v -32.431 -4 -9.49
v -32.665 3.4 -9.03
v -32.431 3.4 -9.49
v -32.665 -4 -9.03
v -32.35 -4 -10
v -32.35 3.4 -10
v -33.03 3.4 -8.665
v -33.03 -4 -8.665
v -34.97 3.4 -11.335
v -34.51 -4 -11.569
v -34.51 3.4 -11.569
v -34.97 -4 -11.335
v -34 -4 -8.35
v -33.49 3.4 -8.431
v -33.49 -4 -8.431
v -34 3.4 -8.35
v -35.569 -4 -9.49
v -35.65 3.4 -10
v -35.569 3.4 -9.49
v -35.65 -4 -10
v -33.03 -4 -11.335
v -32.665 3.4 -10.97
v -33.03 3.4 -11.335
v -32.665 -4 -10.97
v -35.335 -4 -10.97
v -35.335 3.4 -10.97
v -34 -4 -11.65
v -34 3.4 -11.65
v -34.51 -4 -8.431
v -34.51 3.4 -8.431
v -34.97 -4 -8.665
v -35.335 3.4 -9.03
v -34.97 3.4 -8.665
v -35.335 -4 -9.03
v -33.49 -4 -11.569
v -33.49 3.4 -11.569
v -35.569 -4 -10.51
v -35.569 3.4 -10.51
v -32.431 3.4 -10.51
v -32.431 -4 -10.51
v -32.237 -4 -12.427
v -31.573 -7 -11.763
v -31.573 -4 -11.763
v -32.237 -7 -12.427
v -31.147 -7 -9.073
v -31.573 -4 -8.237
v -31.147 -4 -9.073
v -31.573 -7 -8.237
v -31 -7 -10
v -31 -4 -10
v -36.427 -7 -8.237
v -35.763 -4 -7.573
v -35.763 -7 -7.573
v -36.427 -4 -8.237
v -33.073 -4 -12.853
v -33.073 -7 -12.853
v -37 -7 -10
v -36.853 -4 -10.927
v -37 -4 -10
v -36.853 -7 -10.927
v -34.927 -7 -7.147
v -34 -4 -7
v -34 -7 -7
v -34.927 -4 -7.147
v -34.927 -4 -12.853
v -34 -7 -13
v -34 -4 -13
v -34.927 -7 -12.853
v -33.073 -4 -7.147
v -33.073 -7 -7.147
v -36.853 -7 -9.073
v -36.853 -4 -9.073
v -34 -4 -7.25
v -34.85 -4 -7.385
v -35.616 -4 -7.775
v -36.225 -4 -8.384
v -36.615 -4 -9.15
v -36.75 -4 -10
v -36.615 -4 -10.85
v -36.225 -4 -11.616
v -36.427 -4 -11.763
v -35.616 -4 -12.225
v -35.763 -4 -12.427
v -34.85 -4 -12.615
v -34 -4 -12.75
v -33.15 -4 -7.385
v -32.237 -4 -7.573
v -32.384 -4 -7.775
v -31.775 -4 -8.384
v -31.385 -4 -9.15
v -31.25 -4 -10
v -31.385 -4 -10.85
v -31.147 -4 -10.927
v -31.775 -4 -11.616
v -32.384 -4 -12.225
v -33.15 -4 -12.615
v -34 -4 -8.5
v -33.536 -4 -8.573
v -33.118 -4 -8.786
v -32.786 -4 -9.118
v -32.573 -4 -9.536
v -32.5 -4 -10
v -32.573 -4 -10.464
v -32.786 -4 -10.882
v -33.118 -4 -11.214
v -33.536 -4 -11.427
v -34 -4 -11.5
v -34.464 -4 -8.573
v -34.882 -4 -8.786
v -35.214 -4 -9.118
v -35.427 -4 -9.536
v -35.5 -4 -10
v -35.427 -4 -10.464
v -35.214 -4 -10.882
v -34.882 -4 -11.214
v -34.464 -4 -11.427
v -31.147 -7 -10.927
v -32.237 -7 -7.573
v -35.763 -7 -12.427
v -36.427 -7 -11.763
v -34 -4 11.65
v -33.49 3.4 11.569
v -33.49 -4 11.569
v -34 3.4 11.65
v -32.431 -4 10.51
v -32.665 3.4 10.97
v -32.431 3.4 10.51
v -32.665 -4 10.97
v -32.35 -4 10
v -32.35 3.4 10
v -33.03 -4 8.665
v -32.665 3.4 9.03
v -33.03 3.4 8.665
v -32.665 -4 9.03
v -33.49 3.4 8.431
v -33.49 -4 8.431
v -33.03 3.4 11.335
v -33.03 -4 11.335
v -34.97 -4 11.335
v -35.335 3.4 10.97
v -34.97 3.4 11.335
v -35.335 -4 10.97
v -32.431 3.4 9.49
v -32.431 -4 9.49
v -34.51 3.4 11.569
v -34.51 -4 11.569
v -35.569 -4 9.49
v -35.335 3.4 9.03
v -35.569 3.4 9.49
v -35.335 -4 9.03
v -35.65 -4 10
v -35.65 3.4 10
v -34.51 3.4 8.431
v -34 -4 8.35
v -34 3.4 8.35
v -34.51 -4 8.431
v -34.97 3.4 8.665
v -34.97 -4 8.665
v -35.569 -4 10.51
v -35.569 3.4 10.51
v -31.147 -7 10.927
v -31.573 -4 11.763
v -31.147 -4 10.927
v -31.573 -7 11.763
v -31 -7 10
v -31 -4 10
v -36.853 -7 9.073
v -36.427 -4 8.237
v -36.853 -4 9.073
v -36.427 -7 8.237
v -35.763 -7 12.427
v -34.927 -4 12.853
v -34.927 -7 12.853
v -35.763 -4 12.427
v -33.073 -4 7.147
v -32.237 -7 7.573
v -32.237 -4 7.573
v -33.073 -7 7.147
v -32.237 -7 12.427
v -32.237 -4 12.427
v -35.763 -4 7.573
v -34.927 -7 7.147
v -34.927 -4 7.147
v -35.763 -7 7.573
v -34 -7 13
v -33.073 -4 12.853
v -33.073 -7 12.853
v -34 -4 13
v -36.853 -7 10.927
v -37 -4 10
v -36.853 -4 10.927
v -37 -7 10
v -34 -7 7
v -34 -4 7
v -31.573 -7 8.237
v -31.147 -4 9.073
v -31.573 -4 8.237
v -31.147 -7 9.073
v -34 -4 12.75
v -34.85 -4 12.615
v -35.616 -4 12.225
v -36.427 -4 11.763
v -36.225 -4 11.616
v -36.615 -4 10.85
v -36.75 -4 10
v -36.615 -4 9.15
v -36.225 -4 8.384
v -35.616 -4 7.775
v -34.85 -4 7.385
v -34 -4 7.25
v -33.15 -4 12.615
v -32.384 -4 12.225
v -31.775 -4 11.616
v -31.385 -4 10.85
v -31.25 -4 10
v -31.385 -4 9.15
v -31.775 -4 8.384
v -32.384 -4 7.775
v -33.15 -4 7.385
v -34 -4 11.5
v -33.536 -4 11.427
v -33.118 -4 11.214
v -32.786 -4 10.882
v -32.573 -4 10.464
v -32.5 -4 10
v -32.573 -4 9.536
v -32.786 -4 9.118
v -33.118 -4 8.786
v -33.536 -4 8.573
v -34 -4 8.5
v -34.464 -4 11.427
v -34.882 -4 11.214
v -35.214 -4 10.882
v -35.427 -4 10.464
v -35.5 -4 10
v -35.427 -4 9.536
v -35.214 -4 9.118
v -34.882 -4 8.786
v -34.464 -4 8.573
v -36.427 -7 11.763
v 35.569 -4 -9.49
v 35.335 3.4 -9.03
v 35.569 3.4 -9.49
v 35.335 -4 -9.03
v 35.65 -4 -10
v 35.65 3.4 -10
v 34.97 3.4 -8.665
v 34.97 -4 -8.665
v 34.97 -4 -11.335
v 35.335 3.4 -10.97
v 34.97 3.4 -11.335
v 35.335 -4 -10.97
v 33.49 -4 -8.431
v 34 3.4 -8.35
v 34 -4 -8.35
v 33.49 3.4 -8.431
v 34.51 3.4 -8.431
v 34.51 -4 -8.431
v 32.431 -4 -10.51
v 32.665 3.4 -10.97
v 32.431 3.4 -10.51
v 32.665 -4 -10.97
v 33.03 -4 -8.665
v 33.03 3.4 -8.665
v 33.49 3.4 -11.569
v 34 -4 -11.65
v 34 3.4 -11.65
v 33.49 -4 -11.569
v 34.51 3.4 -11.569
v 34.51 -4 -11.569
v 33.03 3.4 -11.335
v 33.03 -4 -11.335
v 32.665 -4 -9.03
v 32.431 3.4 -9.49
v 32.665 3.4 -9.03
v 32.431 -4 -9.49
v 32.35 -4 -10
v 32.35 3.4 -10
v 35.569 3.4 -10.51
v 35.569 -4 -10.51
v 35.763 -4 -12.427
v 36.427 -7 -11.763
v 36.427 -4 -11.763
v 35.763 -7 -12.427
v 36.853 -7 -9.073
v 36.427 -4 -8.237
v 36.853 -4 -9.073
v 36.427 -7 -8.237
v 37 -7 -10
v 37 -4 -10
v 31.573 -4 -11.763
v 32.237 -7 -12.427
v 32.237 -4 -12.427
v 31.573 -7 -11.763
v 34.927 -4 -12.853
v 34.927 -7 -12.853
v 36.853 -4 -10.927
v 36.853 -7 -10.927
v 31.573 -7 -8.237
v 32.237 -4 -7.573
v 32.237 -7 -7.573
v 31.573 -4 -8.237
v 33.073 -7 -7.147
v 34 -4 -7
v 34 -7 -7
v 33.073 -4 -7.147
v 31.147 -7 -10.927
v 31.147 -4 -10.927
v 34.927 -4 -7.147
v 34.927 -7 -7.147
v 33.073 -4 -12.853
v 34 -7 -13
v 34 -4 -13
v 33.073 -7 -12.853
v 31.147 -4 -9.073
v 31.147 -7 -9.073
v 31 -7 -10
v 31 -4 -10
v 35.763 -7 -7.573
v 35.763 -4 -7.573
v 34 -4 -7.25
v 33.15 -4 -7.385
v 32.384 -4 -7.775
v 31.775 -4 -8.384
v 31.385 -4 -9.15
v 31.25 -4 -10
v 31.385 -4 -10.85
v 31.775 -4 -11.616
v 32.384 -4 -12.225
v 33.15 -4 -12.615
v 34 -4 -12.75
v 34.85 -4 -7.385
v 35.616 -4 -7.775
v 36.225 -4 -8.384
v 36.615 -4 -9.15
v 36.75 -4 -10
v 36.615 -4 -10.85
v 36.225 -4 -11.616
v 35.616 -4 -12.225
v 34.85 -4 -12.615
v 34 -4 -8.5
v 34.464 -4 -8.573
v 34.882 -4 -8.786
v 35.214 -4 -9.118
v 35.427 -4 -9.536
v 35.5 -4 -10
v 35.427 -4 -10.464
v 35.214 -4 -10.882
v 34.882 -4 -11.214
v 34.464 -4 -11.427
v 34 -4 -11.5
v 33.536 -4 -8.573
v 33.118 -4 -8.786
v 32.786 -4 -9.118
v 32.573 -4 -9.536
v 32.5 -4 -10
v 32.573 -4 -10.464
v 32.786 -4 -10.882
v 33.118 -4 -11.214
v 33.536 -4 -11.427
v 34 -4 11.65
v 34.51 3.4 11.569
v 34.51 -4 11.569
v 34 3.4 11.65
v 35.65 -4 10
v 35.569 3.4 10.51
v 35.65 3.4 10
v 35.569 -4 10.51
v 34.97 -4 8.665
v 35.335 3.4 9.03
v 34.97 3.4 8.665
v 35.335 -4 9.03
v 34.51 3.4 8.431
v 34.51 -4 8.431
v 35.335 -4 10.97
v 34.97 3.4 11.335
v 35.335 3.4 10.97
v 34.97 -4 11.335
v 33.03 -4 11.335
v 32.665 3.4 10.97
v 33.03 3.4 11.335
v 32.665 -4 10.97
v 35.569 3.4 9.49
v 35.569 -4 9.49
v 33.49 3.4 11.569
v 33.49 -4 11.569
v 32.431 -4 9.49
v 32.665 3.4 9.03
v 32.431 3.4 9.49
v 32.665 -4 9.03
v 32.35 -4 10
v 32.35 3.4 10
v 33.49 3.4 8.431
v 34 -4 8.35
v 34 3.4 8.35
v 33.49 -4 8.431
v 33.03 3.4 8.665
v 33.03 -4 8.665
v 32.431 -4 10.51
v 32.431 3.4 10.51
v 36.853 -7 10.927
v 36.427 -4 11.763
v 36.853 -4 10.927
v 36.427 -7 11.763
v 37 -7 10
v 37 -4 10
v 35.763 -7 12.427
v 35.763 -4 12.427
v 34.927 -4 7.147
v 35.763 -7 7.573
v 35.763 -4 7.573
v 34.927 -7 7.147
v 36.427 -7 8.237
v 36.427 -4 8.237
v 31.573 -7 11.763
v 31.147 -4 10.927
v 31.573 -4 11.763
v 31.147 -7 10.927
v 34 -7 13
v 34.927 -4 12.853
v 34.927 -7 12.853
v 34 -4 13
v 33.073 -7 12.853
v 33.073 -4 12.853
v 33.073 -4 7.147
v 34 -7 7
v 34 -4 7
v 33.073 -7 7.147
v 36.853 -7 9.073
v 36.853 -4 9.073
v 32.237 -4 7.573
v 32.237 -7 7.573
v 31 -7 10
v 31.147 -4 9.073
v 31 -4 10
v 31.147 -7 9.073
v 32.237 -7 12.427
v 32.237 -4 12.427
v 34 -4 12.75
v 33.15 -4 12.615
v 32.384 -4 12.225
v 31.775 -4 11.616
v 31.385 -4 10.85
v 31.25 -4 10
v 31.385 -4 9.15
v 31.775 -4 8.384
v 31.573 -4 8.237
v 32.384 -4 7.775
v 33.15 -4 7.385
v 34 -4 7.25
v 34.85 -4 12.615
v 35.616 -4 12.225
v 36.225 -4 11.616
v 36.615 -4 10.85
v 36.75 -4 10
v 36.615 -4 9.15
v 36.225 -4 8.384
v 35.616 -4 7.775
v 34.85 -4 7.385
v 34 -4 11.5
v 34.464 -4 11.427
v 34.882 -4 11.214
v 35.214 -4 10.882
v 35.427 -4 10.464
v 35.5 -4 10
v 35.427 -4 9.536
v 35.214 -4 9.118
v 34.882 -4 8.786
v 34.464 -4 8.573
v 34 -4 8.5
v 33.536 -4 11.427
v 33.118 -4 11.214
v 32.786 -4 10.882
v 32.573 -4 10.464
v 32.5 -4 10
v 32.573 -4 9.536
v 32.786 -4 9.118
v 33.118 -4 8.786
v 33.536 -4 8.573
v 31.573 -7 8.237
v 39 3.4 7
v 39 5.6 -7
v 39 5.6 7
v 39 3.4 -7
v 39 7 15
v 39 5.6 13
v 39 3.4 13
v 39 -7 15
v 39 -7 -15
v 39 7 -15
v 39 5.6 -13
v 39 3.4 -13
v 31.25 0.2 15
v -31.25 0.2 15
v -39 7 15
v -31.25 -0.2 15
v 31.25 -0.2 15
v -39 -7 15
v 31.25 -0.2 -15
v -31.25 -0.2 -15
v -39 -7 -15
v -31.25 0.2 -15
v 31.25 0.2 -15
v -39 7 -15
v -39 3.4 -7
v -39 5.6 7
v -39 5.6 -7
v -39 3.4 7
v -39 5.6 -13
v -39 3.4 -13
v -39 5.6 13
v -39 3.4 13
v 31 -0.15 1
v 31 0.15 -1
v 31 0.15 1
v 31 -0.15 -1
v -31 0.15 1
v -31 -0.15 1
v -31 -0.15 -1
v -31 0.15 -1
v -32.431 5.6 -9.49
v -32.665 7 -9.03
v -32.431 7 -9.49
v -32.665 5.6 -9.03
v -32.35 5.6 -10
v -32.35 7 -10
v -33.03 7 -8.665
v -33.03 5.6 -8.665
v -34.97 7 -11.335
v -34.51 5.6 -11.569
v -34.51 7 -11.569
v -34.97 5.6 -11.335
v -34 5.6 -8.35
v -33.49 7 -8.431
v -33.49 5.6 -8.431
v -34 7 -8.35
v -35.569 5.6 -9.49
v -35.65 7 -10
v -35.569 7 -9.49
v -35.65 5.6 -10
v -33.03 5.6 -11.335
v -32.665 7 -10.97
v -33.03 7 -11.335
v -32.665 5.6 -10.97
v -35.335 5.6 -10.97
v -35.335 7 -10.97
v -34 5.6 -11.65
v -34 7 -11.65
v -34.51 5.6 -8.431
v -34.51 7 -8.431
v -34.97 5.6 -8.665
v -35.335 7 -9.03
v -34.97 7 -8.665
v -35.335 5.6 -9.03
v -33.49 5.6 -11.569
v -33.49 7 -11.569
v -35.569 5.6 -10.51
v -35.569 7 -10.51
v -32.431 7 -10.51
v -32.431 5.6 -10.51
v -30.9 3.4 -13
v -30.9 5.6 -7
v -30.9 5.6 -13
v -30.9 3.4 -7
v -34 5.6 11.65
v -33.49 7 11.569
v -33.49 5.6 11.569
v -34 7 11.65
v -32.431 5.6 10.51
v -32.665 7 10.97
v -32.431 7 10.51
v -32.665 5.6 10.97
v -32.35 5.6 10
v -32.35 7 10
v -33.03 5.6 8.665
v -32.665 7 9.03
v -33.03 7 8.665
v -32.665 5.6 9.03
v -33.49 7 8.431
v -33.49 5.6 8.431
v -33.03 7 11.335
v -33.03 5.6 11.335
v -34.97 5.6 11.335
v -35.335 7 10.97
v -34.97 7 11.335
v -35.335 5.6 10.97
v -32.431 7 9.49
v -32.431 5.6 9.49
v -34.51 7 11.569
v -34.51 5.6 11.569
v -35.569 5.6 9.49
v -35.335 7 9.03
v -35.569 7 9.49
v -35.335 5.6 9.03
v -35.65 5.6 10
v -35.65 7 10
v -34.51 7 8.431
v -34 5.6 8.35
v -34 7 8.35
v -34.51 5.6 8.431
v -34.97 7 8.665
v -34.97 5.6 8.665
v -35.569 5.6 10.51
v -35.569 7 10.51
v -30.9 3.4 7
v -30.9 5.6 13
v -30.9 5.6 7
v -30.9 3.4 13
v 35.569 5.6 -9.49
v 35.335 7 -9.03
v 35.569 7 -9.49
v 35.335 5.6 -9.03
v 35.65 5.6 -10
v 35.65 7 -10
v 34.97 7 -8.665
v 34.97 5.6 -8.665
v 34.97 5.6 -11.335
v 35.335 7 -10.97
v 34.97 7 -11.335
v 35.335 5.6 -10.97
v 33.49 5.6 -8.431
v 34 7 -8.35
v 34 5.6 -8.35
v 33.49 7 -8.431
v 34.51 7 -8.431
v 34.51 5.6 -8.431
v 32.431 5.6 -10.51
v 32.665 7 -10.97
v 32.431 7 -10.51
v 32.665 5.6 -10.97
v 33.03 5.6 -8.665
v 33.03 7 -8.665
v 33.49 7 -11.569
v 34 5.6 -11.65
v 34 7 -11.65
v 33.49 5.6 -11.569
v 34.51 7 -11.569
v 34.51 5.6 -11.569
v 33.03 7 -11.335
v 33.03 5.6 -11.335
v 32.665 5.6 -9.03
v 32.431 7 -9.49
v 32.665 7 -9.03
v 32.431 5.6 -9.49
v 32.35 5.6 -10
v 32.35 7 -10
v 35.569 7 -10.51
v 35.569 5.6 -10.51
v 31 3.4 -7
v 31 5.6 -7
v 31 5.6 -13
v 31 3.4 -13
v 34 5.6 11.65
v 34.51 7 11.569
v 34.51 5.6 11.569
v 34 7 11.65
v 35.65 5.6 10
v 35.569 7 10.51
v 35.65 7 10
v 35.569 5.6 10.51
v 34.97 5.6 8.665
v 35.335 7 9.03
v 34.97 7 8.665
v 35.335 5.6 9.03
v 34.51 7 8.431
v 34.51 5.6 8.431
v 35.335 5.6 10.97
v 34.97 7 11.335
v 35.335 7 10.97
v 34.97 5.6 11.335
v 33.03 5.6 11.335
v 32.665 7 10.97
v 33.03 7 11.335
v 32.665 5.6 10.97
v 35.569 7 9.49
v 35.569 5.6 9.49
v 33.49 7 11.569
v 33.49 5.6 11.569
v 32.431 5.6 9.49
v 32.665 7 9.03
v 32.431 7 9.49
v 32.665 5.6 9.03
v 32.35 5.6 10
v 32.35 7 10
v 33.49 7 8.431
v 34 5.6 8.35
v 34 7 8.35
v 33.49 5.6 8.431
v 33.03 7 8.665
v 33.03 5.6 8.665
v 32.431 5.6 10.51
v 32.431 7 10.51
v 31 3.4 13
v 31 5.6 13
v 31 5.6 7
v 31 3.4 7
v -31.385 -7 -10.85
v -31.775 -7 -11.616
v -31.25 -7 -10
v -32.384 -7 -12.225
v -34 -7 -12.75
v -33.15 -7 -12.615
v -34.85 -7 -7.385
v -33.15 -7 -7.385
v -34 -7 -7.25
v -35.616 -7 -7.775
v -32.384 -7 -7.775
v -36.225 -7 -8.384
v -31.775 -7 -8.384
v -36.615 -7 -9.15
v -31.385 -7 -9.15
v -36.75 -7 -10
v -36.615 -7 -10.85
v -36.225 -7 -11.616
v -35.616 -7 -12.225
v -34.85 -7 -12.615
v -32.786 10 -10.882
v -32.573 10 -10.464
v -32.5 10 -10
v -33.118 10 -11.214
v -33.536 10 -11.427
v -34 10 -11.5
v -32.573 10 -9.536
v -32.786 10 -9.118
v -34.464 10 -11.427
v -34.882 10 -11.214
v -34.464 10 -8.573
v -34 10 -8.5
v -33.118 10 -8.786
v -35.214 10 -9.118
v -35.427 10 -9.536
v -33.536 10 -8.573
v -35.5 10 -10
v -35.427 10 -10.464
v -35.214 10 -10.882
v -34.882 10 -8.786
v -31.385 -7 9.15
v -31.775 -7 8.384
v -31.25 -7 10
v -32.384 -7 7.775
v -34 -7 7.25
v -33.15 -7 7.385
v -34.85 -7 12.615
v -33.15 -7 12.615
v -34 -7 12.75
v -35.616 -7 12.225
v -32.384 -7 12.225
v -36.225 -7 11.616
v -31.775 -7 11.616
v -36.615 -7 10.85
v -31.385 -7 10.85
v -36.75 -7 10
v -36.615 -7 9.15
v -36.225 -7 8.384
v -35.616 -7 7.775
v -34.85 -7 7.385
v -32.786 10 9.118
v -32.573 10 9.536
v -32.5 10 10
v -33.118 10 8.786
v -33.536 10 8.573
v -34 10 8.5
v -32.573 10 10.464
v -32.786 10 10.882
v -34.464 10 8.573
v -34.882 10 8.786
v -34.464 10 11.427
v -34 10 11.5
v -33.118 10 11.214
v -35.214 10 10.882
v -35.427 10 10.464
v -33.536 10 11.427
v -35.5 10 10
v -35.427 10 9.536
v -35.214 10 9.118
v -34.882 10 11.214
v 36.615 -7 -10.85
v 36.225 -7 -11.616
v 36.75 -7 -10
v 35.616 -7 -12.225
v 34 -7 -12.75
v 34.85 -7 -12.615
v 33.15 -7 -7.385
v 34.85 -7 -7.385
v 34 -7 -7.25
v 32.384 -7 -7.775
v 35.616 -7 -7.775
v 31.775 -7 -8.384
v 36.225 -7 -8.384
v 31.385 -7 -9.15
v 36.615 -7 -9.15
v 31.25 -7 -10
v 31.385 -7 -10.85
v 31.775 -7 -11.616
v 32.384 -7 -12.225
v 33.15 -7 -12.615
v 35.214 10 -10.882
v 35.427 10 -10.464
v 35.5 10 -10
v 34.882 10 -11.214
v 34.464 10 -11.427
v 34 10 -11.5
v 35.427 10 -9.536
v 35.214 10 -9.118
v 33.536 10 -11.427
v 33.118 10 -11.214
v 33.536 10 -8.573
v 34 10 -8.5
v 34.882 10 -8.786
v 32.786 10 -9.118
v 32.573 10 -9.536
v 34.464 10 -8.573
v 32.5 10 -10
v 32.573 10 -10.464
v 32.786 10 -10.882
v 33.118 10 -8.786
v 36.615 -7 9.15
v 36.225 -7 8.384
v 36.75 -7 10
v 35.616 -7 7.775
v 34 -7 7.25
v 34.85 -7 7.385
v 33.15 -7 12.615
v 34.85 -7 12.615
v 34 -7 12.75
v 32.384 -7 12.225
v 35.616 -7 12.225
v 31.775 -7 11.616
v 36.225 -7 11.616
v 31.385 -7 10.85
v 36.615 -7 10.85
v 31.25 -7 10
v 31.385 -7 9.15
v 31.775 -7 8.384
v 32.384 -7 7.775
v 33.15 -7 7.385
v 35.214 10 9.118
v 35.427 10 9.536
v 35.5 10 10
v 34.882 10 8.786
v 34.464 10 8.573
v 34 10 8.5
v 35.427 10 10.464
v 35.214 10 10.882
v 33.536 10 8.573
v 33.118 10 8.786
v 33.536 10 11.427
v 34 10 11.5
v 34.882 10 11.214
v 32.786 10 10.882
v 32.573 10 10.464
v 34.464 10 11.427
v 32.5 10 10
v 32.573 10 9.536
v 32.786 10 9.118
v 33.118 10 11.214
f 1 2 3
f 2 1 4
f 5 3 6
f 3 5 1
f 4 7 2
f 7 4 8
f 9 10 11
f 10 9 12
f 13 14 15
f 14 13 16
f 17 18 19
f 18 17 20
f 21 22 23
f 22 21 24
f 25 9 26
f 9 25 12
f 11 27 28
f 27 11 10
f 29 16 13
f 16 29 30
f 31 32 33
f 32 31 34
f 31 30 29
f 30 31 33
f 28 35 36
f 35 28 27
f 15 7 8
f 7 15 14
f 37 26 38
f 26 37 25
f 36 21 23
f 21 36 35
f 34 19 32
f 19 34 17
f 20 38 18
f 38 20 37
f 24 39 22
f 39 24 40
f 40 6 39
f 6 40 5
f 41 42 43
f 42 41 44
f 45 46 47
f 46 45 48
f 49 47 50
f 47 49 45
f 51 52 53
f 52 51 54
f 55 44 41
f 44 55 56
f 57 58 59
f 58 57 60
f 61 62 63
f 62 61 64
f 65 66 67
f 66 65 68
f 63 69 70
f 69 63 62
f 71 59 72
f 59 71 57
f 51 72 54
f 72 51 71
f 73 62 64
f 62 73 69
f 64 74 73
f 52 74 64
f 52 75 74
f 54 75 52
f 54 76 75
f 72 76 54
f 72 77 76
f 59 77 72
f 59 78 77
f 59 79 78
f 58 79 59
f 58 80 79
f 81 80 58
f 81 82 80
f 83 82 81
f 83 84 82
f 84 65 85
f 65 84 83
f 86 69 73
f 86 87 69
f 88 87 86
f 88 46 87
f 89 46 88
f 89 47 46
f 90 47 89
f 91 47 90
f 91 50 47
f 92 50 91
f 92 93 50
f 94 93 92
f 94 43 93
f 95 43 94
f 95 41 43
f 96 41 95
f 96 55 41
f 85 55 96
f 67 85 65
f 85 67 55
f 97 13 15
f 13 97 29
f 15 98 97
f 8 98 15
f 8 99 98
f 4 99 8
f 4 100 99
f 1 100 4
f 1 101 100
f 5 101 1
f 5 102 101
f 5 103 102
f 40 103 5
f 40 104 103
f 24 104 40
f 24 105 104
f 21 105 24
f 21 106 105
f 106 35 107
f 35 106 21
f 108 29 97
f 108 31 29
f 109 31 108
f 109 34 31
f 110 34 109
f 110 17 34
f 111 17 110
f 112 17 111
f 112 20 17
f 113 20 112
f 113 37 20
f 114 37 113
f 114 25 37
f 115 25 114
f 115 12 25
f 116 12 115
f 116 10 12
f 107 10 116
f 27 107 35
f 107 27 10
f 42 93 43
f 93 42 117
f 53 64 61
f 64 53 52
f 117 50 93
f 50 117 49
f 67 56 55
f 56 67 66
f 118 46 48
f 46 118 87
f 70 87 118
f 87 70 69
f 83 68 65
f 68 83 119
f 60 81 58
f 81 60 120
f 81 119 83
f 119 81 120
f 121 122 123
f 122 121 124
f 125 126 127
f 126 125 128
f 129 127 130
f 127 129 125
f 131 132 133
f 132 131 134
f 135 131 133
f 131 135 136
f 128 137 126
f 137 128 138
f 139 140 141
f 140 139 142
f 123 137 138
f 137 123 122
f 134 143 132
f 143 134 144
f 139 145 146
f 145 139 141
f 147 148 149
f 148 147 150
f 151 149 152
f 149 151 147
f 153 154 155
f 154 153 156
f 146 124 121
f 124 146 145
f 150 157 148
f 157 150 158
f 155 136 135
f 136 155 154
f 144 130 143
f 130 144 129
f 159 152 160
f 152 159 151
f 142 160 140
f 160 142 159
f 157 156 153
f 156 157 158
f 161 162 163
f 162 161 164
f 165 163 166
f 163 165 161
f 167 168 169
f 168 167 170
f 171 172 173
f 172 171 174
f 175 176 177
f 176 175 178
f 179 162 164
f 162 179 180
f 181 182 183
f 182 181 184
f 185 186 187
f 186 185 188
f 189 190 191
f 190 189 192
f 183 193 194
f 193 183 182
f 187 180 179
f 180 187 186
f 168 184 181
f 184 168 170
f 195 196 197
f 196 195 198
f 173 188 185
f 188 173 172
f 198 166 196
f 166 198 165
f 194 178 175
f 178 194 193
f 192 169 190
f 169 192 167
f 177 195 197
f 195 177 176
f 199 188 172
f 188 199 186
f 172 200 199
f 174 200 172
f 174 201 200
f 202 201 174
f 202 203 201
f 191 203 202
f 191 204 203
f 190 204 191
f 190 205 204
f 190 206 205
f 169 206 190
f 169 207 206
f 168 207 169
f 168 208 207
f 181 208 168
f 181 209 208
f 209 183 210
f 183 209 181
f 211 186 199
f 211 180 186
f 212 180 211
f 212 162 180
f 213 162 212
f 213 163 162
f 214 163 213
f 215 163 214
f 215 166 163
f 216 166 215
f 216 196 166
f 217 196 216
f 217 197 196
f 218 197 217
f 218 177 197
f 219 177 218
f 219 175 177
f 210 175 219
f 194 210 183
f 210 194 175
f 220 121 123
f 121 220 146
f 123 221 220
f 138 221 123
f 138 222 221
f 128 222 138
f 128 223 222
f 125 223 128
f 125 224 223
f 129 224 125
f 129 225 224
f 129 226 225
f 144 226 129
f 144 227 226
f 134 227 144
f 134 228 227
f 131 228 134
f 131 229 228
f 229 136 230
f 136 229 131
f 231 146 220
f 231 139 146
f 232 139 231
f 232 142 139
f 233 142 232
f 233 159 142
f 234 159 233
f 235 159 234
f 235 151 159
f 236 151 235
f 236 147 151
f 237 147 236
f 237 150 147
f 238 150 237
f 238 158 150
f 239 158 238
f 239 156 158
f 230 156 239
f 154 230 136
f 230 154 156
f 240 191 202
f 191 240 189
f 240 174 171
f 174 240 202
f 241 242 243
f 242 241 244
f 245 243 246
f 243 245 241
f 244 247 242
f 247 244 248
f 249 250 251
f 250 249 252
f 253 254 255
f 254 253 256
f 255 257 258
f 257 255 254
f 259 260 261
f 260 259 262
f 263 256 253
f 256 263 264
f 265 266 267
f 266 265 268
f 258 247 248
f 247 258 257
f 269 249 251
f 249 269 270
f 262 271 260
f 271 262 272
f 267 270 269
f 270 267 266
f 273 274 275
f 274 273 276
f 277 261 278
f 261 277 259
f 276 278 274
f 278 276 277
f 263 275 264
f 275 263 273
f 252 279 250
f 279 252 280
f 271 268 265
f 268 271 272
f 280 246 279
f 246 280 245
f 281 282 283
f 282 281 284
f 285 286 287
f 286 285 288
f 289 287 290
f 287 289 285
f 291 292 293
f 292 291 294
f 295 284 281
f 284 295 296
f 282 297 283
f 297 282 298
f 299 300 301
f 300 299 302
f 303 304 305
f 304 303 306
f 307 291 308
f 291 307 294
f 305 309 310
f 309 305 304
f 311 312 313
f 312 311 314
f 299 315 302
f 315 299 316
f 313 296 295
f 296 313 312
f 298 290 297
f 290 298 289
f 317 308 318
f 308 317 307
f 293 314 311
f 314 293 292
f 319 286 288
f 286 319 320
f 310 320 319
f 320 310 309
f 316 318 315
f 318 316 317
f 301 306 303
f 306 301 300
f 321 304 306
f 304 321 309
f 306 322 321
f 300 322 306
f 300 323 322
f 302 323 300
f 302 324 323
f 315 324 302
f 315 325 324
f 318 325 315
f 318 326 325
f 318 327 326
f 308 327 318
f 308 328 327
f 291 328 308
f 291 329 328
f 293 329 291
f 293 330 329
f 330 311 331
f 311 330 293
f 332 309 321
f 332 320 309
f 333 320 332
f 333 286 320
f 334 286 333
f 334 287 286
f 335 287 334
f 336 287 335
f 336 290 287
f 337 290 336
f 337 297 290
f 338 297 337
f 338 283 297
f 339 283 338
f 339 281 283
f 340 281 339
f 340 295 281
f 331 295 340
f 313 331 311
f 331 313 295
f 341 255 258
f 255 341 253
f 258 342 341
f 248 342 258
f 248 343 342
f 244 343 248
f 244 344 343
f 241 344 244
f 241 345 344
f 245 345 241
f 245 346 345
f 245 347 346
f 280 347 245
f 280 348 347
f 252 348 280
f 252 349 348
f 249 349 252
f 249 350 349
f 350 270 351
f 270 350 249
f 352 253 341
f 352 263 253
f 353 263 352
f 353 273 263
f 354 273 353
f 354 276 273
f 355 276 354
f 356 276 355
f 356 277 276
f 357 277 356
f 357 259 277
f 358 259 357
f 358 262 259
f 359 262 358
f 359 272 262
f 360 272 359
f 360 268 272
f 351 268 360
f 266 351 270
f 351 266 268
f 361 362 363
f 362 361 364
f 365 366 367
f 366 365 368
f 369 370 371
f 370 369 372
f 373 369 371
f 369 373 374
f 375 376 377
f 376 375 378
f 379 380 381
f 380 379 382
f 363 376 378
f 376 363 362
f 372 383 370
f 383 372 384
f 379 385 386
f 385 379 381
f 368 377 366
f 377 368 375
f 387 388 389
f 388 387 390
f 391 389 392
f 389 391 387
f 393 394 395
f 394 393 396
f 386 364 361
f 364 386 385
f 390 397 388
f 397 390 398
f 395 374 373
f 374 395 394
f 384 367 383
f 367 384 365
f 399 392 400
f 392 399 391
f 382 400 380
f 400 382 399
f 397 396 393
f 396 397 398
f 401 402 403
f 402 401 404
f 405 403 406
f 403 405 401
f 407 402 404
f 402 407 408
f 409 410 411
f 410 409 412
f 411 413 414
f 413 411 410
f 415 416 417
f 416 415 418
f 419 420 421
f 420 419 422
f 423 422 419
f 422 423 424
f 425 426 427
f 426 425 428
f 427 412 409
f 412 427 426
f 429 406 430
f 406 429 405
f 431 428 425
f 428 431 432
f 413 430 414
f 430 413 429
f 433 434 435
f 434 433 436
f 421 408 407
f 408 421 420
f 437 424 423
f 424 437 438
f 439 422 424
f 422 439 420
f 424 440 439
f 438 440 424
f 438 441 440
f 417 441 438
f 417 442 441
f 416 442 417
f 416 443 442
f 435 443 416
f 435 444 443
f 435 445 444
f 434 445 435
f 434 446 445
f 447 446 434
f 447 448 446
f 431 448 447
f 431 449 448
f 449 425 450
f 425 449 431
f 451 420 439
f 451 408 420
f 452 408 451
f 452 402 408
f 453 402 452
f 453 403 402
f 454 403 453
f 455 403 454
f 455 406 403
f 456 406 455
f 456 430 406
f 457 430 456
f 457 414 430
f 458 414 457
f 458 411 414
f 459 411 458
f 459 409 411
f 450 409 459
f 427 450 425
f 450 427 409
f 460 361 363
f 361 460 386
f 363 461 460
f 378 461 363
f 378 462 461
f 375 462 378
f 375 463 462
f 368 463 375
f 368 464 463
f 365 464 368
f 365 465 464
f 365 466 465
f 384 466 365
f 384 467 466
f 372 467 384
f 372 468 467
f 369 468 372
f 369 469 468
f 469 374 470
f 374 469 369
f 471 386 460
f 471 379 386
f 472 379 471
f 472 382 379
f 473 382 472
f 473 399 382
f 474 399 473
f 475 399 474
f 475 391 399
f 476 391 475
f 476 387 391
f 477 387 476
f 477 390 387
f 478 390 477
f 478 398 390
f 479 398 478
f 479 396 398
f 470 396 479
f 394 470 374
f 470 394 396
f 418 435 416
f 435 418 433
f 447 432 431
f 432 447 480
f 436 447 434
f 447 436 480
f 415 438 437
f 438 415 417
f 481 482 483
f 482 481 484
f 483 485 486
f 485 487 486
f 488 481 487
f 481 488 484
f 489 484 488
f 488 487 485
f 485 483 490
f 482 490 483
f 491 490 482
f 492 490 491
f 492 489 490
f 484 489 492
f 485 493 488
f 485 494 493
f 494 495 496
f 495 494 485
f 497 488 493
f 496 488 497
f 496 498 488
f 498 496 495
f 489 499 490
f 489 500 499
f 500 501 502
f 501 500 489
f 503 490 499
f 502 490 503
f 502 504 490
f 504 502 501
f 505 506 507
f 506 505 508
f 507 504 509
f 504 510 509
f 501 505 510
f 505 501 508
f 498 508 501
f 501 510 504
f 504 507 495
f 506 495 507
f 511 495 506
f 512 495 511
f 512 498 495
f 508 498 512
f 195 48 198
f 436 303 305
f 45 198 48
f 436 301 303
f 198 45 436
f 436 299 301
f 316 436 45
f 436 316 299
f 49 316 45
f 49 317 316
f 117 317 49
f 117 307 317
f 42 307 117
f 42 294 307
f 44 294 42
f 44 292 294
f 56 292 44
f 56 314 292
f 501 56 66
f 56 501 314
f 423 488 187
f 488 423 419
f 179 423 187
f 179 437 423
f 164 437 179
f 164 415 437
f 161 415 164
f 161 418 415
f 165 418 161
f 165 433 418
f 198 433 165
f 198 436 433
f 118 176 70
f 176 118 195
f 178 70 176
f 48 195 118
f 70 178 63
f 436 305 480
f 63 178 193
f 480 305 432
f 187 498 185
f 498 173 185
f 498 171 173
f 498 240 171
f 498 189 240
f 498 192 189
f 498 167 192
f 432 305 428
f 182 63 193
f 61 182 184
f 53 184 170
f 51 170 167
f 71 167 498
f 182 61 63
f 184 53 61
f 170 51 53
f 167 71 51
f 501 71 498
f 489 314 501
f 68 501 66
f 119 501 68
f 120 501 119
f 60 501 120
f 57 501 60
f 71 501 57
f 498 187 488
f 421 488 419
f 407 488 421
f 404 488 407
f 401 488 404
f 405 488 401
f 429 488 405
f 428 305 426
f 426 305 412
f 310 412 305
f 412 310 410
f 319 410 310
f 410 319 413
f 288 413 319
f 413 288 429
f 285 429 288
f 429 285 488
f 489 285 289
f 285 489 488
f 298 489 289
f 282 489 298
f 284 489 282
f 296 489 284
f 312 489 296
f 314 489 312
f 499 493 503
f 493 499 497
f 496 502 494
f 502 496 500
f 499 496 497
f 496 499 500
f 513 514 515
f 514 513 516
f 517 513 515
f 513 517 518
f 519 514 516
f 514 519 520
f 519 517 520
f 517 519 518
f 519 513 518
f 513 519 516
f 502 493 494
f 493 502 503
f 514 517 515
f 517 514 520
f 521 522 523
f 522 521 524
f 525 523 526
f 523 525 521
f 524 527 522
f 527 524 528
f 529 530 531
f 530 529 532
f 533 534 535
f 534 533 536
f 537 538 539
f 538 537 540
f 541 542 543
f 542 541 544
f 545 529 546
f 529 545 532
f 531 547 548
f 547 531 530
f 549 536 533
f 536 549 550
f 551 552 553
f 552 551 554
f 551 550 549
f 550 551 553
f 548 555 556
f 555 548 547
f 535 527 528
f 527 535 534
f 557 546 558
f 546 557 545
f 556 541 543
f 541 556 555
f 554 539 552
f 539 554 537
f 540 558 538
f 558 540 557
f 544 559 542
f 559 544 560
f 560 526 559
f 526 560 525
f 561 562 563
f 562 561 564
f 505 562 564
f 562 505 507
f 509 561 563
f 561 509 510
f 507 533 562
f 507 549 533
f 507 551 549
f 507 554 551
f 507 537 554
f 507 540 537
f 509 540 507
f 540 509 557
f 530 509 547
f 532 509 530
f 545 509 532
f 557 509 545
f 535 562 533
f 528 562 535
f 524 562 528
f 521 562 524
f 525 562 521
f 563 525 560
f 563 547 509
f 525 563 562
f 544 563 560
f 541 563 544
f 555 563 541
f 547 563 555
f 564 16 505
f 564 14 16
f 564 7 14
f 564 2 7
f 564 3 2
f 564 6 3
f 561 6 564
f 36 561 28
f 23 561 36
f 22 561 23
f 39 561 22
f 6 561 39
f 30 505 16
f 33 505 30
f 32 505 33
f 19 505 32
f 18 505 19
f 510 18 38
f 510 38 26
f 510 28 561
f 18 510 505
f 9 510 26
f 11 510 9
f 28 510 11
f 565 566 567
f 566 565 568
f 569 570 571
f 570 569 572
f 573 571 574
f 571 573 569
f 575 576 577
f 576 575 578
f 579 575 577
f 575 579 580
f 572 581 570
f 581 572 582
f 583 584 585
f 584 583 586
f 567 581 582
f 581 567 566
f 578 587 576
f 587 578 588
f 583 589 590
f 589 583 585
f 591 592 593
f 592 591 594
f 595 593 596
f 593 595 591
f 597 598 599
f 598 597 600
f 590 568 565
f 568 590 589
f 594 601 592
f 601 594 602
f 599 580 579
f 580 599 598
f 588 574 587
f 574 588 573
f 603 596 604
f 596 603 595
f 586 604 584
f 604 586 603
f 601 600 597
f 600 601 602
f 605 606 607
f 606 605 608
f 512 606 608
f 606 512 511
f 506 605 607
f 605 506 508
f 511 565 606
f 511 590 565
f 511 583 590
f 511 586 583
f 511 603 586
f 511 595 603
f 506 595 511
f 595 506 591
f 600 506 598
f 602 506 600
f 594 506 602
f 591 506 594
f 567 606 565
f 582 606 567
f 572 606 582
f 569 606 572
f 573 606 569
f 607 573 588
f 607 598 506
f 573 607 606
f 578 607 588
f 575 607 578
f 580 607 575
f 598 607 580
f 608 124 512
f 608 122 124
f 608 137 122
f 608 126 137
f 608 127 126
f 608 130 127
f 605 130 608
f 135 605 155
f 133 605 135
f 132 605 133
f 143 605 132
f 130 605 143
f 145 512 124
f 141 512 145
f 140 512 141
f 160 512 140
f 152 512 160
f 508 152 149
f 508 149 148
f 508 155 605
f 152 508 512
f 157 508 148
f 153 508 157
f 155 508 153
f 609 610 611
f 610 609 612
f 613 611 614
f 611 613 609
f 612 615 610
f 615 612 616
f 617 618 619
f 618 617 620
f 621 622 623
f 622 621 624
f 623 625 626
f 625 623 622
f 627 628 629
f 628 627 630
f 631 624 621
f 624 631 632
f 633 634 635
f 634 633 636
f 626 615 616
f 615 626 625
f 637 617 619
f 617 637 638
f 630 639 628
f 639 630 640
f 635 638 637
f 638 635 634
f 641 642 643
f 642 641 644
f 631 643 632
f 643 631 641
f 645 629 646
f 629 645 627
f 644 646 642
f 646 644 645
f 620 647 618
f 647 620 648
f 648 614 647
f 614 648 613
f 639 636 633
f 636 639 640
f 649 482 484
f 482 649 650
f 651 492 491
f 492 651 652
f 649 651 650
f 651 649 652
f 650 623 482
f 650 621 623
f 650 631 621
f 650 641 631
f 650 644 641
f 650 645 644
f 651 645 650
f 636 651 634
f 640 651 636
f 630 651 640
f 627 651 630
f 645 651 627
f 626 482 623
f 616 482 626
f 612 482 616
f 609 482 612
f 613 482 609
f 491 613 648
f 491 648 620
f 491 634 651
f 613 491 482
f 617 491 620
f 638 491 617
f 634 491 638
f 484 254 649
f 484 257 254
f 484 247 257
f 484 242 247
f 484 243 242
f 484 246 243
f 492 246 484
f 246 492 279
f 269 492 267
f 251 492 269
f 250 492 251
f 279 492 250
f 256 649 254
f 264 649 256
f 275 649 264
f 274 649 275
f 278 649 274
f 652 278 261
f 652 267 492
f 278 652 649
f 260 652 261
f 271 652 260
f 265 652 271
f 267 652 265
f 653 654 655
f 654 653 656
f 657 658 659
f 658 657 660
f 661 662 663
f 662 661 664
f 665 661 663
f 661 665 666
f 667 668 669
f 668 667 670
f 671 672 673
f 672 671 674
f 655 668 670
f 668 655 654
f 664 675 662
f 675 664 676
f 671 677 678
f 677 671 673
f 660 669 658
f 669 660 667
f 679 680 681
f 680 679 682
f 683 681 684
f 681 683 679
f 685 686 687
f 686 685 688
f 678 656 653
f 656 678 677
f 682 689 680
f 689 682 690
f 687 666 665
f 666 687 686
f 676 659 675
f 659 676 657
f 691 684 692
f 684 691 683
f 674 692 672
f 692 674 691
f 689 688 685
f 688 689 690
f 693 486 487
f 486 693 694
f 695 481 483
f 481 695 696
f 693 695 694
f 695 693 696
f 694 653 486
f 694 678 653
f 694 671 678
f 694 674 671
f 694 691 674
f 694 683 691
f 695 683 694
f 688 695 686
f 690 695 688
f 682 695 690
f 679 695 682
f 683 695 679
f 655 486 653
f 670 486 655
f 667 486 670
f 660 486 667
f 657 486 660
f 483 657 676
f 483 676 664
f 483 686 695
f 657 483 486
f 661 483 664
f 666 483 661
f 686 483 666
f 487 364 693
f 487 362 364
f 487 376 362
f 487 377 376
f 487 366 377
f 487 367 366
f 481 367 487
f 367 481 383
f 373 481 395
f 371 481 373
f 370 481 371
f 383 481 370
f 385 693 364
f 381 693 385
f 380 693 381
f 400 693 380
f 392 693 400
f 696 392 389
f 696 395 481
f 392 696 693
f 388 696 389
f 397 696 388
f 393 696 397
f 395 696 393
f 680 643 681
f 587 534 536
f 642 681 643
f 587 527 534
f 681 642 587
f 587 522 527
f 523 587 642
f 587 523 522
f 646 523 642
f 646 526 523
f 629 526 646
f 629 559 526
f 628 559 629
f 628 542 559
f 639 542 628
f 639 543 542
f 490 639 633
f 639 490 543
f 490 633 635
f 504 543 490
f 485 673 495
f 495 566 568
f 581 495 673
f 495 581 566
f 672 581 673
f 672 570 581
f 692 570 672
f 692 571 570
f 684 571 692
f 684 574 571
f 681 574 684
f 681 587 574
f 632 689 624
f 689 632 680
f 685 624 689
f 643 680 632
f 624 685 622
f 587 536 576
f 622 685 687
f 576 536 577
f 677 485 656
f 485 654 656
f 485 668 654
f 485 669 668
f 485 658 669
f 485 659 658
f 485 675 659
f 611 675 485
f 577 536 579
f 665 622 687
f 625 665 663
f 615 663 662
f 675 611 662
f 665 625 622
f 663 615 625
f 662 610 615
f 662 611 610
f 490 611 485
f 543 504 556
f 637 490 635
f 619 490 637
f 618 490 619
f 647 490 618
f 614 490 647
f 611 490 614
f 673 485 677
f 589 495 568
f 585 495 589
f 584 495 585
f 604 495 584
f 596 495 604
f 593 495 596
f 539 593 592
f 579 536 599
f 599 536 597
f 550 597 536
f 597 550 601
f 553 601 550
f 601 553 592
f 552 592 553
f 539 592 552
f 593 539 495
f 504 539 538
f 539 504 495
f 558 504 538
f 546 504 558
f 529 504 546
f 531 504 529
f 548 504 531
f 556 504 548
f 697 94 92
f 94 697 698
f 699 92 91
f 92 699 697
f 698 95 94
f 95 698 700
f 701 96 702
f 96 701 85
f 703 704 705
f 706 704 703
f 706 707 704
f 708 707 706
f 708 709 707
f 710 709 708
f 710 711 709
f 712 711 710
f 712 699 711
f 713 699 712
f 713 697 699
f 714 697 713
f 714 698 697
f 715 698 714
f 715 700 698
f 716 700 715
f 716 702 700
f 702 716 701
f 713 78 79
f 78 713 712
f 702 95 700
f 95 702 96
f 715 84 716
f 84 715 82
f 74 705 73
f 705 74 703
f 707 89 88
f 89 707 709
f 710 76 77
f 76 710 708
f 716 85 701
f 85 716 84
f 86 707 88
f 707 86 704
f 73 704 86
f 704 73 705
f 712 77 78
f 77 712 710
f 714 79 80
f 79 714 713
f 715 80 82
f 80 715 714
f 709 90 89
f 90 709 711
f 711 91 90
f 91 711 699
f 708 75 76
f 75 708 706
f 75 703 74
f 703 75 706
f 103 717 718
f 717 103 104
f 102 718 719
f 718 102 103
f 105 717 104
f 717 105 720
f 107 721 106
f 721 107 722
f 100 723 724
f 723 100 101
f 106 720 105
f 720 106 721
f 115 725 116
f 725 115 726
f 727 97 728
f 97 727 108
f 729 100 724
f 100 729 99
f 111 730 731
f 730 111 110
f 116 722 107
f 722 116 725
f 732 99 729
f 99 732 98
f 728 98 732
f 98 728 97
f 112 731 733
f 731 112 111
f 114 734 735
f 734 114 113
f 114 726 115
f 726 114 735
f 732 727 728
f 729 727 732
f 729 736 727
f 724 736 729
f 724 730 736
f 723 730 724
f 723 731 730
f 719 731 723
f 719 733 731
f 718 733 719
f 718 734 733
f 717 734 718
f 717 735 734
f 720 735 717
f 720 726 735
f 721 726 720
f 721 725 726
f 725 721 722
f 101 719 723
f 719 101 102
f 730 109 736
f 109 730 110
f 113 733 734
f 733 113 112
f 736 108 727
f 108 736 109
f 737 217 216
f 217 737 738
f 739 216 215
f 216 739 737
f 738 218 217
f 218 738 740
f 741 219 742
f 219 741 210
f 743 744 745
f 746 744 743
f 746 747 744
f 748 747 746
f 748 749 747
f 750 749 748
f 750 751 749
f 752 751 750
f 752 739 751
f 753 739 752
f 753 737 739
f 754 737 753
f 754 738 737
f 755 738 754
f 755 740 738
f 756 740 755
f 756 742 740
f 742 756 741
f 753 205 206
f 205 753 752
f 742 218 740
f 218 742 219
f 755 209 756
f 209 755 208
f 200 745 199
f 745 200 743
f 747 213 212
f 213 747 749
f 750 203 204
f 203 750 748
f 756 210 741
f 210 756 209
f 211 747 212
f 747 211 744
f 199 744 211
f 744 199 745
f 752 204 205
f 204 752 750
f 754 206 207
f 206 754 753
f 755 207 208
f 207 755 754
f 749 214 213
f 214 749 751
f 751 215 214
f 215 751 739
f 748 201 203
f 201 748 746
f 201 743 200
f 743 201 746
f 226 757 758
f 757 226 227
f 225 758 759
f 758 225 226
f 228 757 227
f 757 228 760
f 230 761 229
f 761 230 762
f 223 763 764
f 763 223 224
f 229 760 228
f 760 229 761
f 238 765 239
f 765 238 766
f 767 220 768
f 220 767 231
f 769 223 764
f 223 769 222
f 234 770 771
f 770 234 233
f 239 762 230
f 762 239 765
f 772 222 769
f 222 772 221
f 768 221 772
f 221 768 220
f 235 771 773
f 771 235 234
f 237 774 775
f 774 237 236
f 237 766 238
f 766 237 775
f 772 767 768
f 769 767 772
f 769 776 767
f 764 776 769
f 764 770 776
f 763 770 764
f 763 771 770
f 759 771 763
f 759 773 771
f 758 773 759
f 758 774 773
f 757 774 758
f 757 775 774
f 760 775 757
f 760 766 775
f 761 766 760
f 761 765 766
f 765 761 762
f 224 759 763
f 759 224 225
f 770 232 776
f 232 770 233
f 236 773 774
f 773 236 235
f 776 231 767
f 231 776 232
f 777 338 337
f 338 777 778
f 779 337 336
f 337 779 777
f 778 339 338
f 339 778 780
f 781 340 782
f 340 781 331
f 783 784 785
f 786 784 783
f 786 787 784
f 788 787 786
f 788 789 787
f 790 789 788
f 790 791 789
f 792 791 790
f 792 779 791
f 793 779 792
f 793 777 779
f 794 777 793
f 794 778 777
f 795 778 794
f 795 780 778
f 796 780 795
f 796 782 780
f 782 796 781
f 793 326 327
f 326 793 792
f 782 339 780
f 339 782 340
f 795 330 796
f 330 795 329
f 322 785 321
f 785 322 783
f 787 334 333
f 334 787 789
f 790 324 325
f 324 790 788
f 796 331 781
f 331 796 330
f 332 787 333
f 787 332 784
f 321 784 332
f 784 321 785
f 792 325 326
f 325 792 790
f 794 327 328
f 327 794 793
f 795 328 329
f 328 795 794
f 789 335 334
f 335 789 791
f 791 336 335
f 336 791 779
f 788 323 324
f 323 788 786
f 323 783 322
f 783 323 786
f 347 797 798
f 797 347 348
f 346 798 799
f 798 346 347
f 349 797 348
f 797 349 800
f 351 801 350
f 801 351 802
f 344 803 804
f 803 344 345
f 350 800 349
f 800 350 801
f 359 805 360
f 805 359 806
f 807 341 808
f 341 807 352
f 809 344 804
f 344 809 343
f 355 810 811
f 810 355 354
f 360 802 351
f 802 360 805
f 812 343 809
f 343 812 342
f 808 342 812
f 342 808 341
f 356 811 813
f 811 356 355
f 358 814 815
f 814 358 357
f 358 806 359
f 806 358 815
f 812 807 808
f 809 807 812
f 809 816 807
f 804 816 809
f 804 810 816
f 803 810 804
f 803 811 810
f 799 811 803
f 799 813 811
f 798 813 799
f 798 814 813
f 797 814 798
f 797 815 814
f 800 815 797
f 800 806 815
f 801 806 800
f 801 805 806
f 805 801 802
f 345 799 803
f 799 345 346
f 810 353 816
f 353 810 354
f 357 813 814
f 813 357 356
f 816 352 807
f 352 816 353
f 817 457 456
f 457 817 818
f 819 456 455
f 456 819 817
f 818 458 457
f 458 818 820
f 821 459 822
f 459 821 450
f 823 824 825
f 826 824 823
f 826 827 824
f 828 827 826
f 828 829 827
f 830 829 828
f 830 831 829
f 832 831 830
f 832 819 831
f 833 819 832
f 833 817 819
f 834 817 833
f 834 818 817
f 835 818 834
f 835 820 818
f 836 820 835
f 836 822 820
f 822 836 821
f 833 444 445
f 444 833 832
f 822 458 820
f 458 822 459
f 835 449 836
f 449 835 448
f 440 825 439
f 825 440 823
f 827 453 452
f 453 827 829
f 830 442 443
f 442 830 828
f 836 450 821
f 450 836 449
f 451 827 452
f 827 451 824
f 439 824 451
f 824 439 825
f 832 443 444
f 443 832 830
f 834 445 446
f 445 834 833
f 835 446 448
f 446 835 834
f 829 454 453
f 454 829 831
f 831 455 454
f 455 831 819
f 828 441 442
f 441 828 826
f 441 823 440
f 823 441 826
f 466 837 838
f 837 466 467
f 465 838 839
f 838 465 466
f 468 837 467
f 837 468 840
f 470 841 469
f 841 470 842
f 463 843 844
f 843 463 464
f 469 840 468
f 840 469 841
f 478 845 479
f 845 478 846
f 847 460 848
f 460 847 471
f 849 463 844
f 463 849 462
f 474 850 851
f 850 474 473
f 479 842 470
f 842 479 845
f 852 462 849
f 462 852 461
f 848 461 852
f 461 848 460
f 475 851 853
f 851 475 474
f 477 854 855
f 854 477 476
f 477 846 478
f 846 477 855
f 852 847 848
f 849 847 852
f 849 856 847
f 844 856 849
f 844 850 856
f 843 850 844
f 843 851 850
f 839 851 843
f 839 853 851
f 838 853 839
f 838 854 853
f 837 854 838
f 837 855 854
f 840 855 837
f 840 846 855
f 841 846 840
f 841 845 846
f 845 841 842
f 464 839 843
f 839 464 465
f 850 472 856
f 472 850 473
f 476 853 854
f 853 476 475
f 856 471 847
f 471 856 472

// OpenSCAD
// OpenSCAD Model for Aeropress Metal Filter Cleaner (AMFC)
// Clamped 3-Piece Design using standard M3 Screws:
// 1. Front Half (Rigid): Holds front TPU blade, contains M3 clearance holes.
// 2. Back Half (Rigid): Holds back TPU blade, contains M3 tap holes.
// 3. Wiper Blades (Flexible, x2): Simple flat TPU sheets (55mm x 15mm x 1.5mm).

// --- PART SELECTOR ---
part = "all"; // [all: Visual Assembly, front: Front Half (Rigid), back: Back Half (Rigid), blade: Flex PLA Insert (Flexible)]

// --- PARAMETERS ---
filter_di = 62.0;       // Standard metal filter diameter
filter_thickness = 0.3; // Metal filter thickness
wall_thickness = 3.0;   // Outer wall shell thickness

// Frame & Flex dimensions
frame_w = filter_di + 2 * wall_thickness + 10.0; // 78mm total width
frame_h = 30.0;                                  // 30mm vertical height
frame_t = 5.0;                                   // 5mm thick rigid backing plates
flex_t = 2.0;                                    // 2mm thick flex PLA inserts

// Dado (Filter Channel) dimensions
dado_w = filter_di + 0.5; // 62.5mm width (0.5mm clearance)
dado_d = 0.15;            // 0.15mm depth per side (0.3mm total channel gap)

// Scraping Ridge dimensions
ridge_w = 62.0; // 62mm wide (covers filter mesh area)
ridge_h = 0.15; // 0.15mm height above dado bottom (reaches split plane)
ridge_t = 2.0;  // 2.0mm vertical width of the ridge

// M3 Screw spacing
screw_x_offset = frame_w / 2 - 5.0; // 34mm from center (screws at x = -34 and +34)
screw_z_offset = 10.0;              // screws at z = -10 and +10

// M3 Square Nut dimensions (DIN 562)
nut_pocket_w = 6.0; // 6.0mm flat-to-flat pocket width (5.5mm nut + 0.5mm tolerance)
nut_pocket_d = 2.2; // 2.2mm pocket depth (1.8mm nut + 0.4mm tolerance)

// --- ANIMATION CONTROLS ---
animate = false;
time_t = undef;
t_val = (time_t != undef) ? time_t : $t;

// Filter position animation (passes through from top to bottom)
// t = 0.2 -> 0.8: filter slides from z = 45 (above) to z = -45 (below)
filter_z = 
    (t_val < 0.2) ? 45.0 :
    (t_val < 0.8) ? 45.0 - ((t_val - 0.2) / 0.6) * 90.0 :
    -45.0;

if (part == "all") {
    assembly();
} else if (part == "front") {
    front_half();
} else if (part == "back") {
    back_half();
} else if (part == "blade") {
    flex_plate();
}

module assembly() {
    // 1. Front Half (Rigid, transparent in assembly to see inside)
    color([0.7, 0.7, 0.7, 0.5])
        translate([0, -flex_t, 0])
            front_half();
            
    // 2. Front Flex Plate (Flex PLA, transparent blue, grooved)
    color([0.0, 0.0, 1.0, 0.6])
        translate([0, 0, 0])
            flex_plate();
            
    // 3. Back Flex Plate (Flex PLA, transparent blue, mirrored to face front)
    color([0.0, 0.0, 1.0, 0.6])
        mirror([0, 1, 0])
            flex_plate();
            
    // 4. Back Half (Rigid, solid)
    color("gray")
        translate([0, flex_t, 0])
            back_half();
                
    // 5. Mock M3 Screws (x4)
    // Shaft heads are on the front surface (y = -flex_t - frame_t)
    for (x = [-screw_x_offset, screw_x_offset]) {
        for (z = [-screw_z_offset, screw_z_offset]) {
            translate([x, -flex_t - frame_t, z])
                rotate([-90, 0, 0])
                    mock_m3_screw(len = 14.0);
        }
    }
    
    // 6. Mock Metal Filter (Animated)
    if (animate || t_val > 0) {
        translate([0, -filter_thickness/2, filter_z])
            rotate([90, 0, 0])
                color("silver")
                    cylinder(d = filter_di, h = filter_thickness, center = true, $fn = 100);
    }
}

module front_half() {
    // Simple flat front clamp plate.
    // Local coordinate origin [0,0,0] is on the mating plane.
    // Plate extends in the -Y direction from y = 0 to -frame_t.
    difference() {
        // Main block
        translate([-frame_w/2, -frame_t, -frame_h/2])
            cube([frame_w, frame_t, frame_h]);
            
        // M3 Screw Clearance Holes with Counterbores
        for (x = [-screw_x_offset, screw_x_offset]) {
            for (z = [-screw_z_offset, screw_z_offset]) {
                // Shaft clearance (D=3.3)
                translate([x, 1.0, z])
                    rotate([90, 0, 0])
                        cylinder(d = 3.3, h = frame_t + 2.0, $fn = 20);
                // Counterbore recess (D=6.0, depth 3.0)
                translate([x, -frame_t + 3.0, z])
                    rotate([90, 0, 0])
                        cylinder(d = 6.0, h = 4.1, $fn = 20);
            }
        }
    }
}

module back_half() {
    // Simple flat back clamp plate.
    // Local coordinate origin [0,0,0] is on the mating plane.
    // Plate extends in the +Y direction from y = 0 to frame_t.
    difference() {
        // Main block
        translate([-frame_w/2, 0.0, -frame_h/2])
            cube([frame_w, frame_t, frame_h]);
            
        // M3 Screw Clearance Holes (D=3.3) and Captive Square Nut Slots
        for (x = [-screw_x_offset, screw_x_offset]) {
            for (z = [-screw_z_offset, screw_z_offset]) {
                // Clearance shaft
                translate([x, frame_t + 1.0, z])
                    rotate([90, 0, 0])
                        cylinder(d = 3.3, h = frame_t + 2.0, $fn = 20);
                
                // Captive slot pocket cut from the side edges
                if (x < 0) {
                    translate([-frame_w/2 - 0.1, (frame_t - nut_pocket_d)/2, z - nut_pocket_w/2])
                        cube([frame_w/2 - screw_x_offset + nut_pocket_w/2 + 0.2, nut_pocket_d, nut_pocket_w]);
                } else {
                    translate([screw_x_offset - nut_pocket_w/2, (frame_t - nut_pocket_d)/2, z - nut_pocket_w/2])
                        cube([frame_w/2 - screw_x_offset + nut_pocket_w/2 + 0.2, nut_pocket_d, nut_pocket_w]);
                }
            }
        }
    }
}

module flex_plate() {
    // Symmetric flexible clamping plate with dado (channel) and scraping ridge.
    // Local coordinate origin [0,0,0] is on the mating plane.
    // Base plate extends in the -Y direction from y = 0 to -flex_t.
    difference() {
        union() {
            // 1. Base plate with vertical channel and funnel cut out
            difference() {
                // Base block
                translate([-frame_w/2, -flex_t, -frame_h/2])
                    cube([frame_w, flex_t, frame_h]);
                // Vertical Dado (channel of depth dado_d = 0.15)
                translate([-dado_w/2, -dado_d - 0.05, -frame_h/2 - 1.0])
                    cube([dado_w, dado_d + 0.1, frame_h + 2.0]);
                // Entry Funnel (slants the channel back to the plate rear face)
                translate([-dado_w/2, 0, 0])
                    rotate([0, 90, 0])
                        linear_extrude(height = dado_w)
                            polygon([
                                [-dado_d, frame_h/2 - 3.0],
                                [-flex_t - 0.1, frame_h/2 + 0.1],
                                [-dado_d, frame_h/2 + 0.1]
                            ]);
            }
            // 2. Scraping Ridge (added back on top of the channel surface)
            // Starts at y = -dado_d (-0.15), extends by ridge_h (0.15) to y = 0.0 (mating plane)
            translate([-ridge_w/2, -dado_d, -ridge_t/2])
                cube([ridge_w, ridge_h, ridge_t]);
        }
        // 3. M3 Screw Clearance Holes (D=3.3)
        for (x = [-screw_x_offset, screw_x_offset]) {
            for (z = [-screw_z_offset, screw_z_offset]) {
                translate([x, 1.0, z])
                    rotate([90, 0, 0])
                        cylinder(d = 3.3, h = flex_t + 2.0, $fn = 20);
            }
        }
    }
}

module mock_m3_screw(len = 12.0) {
    color("silver") {
        // Cap Head (D=5.5, H=3.0)
        cylinder(d = 5.5, h = 3.0, $fn = 20);
        // Shaft (D=3.0, H=len)
        translate([0, 0, 3.0])
            cylinder(d = 3.0, h = len, $fn = 20);
    }
}
